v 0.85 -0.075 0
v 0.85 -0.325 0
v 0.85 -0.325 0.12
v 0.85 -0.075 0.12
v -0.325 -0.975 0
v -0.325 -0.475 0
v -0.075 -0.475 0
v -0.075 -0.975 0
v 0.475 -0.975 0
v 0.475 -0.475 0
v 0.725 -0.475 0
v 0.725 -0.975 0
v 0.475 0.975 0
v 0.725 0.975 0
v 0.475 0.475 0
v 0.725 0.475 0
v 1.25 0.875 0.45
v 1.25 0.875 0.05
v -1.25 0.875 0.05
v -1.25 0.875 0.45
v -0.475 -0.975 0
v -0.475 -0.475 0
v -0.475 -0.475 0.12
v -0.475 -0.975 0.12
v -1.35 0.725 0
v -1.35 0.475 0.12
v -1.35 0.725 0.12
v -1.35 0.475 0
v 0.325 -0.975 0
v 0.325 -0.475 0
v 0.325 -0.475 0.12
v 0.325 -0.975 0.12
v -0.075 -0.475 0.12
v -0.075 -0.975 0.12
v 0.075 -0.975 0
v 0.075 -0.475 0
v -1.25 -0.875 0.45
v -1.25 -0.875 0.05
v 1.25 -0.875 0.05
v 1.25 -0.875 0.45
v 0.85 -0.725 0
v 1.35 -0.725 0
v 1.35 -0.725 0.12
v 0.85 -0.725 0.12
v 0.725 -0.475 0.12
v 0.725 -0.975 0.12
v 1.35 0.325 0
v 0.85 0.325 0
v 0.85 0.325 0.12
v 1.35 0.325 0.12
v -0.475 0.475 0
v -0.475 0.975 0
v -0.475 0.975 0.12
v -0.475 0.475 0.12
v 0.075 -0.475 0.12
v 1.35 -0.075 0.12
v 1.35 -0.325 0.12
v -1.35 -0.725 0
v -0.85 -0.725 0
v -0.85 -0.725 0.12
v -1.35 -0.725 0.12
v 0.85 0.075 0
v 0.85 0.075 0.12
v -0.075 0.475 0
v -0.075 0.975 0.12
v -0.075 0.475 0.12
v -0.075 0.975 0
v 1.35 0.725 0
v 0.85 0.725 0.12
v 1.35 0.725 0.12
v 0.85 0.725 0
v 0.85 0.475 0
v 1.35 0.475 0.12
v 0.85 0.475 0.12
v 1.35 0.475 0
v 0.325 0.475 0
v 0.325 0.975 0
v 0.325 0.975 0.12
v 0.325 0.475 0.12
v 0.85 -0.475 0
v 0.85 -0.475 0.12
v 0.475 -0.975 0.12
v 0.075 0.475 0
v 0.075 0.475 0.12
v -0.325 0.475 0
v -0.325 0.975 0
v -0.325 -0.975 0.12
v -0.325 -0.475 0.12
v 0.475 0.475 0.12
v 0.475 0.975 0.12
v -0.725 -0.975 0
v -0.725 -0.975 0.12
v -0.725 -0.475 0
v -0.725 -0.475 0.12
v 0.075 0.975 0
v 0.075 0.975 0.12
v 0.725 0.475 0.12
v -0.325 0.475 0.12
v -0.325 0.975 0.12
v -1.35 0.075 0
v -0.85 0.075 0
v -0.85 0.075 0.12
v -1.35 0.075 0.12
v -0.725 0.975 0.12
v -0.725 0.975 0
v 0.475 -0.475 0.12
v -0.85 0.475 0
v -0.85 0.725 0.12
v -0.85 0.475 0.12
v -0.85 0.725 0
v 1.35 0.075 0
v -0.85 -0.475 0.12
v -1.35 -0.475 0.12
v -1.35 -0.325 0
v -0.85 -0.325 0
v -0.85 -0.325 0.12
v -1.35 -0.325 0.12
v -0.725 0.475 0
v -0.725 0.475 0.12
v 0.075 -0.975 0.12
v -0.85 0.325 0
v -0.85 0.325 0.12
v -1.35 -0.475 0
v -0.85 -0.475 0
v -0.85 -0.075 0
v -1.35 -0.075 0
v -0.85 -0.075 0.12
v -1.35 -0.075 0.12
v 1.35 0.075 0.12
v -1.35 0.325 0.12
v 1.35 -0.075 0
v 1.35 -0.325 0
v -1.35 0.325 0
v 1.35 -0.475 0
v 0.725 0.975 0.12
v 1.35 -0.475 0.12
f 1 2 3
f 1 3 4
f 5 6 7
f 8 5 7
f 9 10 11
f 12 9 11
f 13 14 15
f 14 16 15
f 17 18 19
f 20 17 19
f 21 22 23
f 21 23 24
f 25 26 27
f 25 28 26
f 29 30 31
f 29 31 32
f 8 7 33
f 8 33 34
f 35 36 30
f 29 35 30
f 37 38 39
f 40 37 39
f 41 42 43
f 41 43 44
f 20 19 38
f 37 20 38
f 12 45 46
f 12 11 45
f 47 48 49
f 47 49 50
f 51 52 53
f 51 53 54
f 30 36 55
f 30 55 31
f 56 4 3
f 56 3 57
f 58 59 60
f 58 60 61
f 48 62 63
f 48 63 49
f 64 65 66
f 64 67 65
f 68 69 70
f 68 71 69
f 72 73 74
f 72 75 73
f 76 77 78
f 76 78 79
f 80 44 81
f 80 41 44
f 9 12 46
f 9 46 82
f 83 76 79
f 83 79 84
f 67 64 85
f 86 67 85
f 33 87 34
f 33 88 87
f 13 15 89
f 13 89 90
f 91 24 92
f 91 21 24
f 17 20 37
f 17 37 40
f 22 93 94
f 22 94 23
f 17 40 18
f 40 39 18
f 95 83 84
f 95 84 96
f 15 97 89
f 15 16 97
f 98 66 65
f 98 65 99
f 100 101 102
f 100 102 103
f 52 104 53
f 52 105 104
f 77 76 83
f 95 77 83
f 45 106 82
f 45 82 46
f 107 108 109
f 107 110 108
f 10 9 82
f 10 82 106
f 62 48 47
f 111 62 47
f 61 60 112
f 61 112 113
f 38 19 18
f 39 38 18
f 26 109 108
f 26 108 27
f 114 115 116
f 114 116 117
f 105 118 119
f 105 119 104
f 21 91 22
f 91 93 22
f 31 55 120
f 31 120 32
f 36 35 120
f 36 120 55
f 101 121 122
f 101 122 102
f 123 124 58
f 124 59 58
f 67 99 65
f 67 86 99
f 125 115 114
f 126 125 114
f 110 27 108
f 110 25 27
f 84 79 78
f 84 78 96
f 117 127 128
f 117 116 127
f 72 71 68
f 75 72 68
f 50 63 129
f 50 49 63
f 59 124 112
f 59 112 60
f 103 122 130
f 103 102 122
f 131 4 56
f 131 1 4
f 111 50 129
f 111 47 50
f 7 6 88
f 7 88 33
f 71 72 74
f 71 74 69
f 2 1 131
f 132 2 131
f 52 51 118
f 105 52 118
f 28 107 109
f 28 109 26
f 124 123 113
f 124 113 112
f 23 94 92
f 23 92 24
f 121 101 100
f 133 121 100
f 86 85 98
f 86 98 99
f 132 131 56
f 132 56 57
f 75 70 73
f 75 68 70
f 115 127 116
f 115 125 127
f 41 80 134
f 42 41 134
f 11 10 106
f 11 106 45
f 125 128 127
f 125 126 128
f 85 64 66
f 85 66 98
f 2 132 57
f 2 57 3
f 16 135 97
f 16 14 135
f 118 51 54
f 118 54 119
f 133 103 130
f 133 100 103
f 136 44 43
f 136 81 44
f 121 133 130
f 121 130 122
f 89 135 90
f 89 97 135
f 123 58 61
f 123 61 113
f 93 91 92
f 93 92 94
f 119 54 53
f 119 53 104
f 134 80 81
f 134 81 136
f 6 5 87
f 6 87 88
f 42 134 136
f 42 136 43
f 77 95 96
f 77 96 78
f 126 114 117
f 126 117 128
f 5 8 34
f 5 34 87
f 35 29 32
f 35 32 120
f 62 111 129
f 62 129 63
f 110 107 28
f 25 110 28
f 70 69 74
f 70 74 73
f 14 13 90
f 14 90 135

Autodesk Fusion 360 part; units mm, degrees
ref_plane "WorkPlane1" through (0, 0, 0.05) normal (0, 0, 1) x (1, 0, 0) in component "Component"
sketch "Sketch1" plane through (0, 0, 0.05) normal (0, 0, 1) x (1, 0, 0) in component "Component"
  line L0 (1.25, 0.875) -> (-1.25, 0.875)
  line L1 (-1.25, 0.875) -> (-1.25, -0.875)
  line L2 (-1.25, -0.875) -> (1.25, -0.875)
  line L3 (1.25, -0.875) -> (1.25, 0.875)
  line L4 (1.25, 0.875) -> (-1.25, -0.875) construction
  line L5 (-1.25, 0.875) -> (1.25, -0.875) construction
  dimension "d9" = 2.5
  dimension "d10" = 1.75
extrude "Extrude1" add sketch "Sketch1" along normal blind 0.4 makes body 1 in component "Component"
sketch "Sketch1 (2)" plane through (0, 0, 0) normal (0, 0, 1) x (1, 0, 0) in component "lead"
  line L0 (0.85, -0.075) -> (1.35, -0.075)
  line L1 (1.35, -0.075) -> (1.35, -0.325)
  line L2 (1.35, -0.325) -> (0.85, -0.325)
  line L3 (0.85, -0.325) -> (0.85, -0.075)
  line L4 (-0.325, -0.475) -> (-0.075, -0.475)
  line L5 (-0.075, -0.475) -> (-0.075, -0.975)
  line L6 (-0.075, -0.975) -> (-0.325, -0.975)
  line L7 (-0.325, -0.975) -> (-0.325, -0.475)
  point P0 (0.85, -0.2)
  point P1 (-0.2, -0.475)
  dimension "d15" = 0.25
  dimension "d16" = 0.5
  dimension "d17" = 1.35
  dimension "d24" = 0.2
  dimension "d27" = 0.25
  dimension "d28" = 0.5
  dimension "d29" = 0.2
  dimension "d30" = 0.975
extrude "Extrude1'" add sketch "Sketch1 (2)" along normal blind 0.12 separate body contours L0 L1 L2 L3 makes body 2 in component "lead"
pattern_linear "R-Pattern1" count 4 spacing 0.4 along (0, 1, 0) both ways of "Extrude1'" makes body 3 makes body 4 makes body 5 in component "lead"
pattern_circular "C-Pattern1" count 2 over 360 about axis through (0, 0, 1.75) along (0, 0, 1) of "R-Pattern1", "Extrude1'" makes body 6 makes body 7 makes body 8 makes body 9 in component "lead"
extrude "Extrude2" add sketch "Sketch1 (2)" along normal blind 0.12 separate body contours L4 L5 L6 L7 makes body 10 in component "lead"
pattern_linear "R-Pattern2" count 4 spacing 0.4 along (1, 0, 0) both ways of "Extrude2" makes body 11 makes body 12 makes body 13 in component "lead"
pattern_circular "C-Pattern2" count 2 over 360 about axis through (0, 0, 1.75) along (0, 0, 1) of "R-Pattern2", "Extrude2" makes body 14 makes body 15 makes body 16 makes body 17 in component "lead"
component "Component" placed x (1, 0, 0) y (0, 1, 0) z (0, 0, 1) at (0, 0, 0)
component "lead" placed x (1, 0, 0) y (0, 1, 0) z (0, 0, 1) at (0, 0, 0)
equation "qfp16_3_2_above_board = 0.05 mm"
equation "qfp16_3_2_package_width = 2.5 mm"
equation "qfp16_3_2_package_length = 1.75 mm"
equation "qfp16_3_2_package_height = 0.4 mm"
equation "qfp16_3_2_lead_thick = 0.12 mm"
equation "qfp16_3_2_lead_width = 0.25 mm"
equation "qfp16_3_2_lead_spacing = 0.4 mm"
equation "d8 = qfp16_3_2_above_board"
equation "d9 = qfp16_3_2_package_width"
equation "d10 = qfp16_3_2_package_length"
equation "d11 = qfp16_3_2_package_height"
equation "qfp16_3_2_lead_length = 0.5 mm"
equation "qfp16_3_2_lead_extension = 0.1 mm"
equation "d15 = qfp16_3_2_lead_width"
equation "d16 = qfp16_3_2_lead_length"
equation "d17 = qfp16_3_2_package_width / 2 + qfp16_3_2_lead_extension"
equation "d18 = qfp16_3_2_lead_thick"
equation "d22 = qfp16_3_2_lead_spacing"
equation "d24 = qfp16_3_2_lead_spacing / 2"
equation "d27 = qfp16_3_2_lead_width"
equation "d28 = qfp16_3_2_lead_length"
equation "d29 = qfp16_3_2_lead_spacing / 2"
equation "d30 = qfp16_3_2_package_length / 2 + qfp16_3_2_lead_extension"
equation "d31 = qfp16_3_2_lead_thick"
equation "d35 = qfp16_3_2_lead_spacing"
